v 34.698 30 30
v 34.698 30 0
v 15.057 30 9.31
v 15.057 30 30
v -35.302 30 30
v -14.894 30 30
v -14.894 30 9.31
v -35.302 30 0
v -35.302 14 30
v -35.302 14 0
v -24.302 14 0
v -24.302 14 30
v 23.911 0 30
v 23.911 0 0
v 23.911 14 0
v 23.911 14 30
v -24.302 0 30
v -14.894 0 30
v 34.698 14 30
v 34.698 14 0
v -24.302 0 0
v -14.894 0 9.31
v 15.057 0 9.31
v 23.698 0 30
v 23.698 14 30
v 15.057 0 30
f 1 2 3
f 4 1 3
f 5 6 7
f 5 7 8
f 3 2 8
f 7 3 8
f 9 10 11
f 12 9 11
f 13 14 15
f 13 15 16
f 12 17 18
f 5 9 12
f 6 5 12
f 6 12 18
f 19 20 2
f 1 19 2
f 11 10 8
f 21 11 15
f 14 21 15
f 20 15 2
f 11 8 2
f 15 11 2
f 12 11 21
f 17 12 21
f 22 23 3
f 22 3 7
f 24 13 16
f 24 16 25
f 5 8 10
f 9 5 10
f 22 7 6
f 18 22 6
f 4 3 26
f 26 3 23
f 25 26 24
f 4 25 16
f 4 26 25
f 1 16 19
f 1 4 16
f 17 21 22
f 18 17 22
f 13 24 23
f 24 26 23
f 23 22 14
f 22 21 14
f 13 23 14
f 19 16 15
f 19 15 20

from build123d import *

# Parameters (mm, degrees)
F1_DEPTH = 30
F3_DEPTH = 30


# Not quite as in the source:
# - a feature of the source that left no trace in its solid (it failed there, or was rolled back) is left out


with BuildPart() as f1:
    # F0 (on Top) → F1 (new body)
    with BuildSketch(Plane.XY):
        Polygon((-24.3018865001, 0), (-19.4716978501, 0), (-14.9433972497, 0), (-14.9433972497, 30), (-35.3018865001, 30), (-35.3018865001, 14), (-24.3018865001, 14), align=None)
    extrude(amount=F1_DEPTH)



with BuildPart() as f1b:
    # F0 (on Top) → F1, piece 2 (new body)
    with BuildSketch(Plane.XY):
        Polygon((34.6981134999, 30), (15.0566027503, 30), (15.0566027503, 0), (23.6981134999, 0), (23.6981134999, 14), (34.6981134999, 14), align=None)
    extrude(amount=F1_DEPTH)


with BuildPart() as f1_1:
    add(f1.part)

    add(f1b.part)  # F3 merges F1b
    # F2 (on Front) → F3 (join)
    with BuildSketch(Plane.XZ):
        Polygon((-24.0894670747, 0), (23.9105329253, 0), (23.9105329253, 30), (15.2907075817, 29.9856962232), (15.2907075817, 9.3100926116), (-14.8941018885, 9.3100926116), (-14.8941018885, 30), (-24.0894670747, 30), align=None)
    extrude(amount=-F3_DEPTH)


solid = f1_1.part
